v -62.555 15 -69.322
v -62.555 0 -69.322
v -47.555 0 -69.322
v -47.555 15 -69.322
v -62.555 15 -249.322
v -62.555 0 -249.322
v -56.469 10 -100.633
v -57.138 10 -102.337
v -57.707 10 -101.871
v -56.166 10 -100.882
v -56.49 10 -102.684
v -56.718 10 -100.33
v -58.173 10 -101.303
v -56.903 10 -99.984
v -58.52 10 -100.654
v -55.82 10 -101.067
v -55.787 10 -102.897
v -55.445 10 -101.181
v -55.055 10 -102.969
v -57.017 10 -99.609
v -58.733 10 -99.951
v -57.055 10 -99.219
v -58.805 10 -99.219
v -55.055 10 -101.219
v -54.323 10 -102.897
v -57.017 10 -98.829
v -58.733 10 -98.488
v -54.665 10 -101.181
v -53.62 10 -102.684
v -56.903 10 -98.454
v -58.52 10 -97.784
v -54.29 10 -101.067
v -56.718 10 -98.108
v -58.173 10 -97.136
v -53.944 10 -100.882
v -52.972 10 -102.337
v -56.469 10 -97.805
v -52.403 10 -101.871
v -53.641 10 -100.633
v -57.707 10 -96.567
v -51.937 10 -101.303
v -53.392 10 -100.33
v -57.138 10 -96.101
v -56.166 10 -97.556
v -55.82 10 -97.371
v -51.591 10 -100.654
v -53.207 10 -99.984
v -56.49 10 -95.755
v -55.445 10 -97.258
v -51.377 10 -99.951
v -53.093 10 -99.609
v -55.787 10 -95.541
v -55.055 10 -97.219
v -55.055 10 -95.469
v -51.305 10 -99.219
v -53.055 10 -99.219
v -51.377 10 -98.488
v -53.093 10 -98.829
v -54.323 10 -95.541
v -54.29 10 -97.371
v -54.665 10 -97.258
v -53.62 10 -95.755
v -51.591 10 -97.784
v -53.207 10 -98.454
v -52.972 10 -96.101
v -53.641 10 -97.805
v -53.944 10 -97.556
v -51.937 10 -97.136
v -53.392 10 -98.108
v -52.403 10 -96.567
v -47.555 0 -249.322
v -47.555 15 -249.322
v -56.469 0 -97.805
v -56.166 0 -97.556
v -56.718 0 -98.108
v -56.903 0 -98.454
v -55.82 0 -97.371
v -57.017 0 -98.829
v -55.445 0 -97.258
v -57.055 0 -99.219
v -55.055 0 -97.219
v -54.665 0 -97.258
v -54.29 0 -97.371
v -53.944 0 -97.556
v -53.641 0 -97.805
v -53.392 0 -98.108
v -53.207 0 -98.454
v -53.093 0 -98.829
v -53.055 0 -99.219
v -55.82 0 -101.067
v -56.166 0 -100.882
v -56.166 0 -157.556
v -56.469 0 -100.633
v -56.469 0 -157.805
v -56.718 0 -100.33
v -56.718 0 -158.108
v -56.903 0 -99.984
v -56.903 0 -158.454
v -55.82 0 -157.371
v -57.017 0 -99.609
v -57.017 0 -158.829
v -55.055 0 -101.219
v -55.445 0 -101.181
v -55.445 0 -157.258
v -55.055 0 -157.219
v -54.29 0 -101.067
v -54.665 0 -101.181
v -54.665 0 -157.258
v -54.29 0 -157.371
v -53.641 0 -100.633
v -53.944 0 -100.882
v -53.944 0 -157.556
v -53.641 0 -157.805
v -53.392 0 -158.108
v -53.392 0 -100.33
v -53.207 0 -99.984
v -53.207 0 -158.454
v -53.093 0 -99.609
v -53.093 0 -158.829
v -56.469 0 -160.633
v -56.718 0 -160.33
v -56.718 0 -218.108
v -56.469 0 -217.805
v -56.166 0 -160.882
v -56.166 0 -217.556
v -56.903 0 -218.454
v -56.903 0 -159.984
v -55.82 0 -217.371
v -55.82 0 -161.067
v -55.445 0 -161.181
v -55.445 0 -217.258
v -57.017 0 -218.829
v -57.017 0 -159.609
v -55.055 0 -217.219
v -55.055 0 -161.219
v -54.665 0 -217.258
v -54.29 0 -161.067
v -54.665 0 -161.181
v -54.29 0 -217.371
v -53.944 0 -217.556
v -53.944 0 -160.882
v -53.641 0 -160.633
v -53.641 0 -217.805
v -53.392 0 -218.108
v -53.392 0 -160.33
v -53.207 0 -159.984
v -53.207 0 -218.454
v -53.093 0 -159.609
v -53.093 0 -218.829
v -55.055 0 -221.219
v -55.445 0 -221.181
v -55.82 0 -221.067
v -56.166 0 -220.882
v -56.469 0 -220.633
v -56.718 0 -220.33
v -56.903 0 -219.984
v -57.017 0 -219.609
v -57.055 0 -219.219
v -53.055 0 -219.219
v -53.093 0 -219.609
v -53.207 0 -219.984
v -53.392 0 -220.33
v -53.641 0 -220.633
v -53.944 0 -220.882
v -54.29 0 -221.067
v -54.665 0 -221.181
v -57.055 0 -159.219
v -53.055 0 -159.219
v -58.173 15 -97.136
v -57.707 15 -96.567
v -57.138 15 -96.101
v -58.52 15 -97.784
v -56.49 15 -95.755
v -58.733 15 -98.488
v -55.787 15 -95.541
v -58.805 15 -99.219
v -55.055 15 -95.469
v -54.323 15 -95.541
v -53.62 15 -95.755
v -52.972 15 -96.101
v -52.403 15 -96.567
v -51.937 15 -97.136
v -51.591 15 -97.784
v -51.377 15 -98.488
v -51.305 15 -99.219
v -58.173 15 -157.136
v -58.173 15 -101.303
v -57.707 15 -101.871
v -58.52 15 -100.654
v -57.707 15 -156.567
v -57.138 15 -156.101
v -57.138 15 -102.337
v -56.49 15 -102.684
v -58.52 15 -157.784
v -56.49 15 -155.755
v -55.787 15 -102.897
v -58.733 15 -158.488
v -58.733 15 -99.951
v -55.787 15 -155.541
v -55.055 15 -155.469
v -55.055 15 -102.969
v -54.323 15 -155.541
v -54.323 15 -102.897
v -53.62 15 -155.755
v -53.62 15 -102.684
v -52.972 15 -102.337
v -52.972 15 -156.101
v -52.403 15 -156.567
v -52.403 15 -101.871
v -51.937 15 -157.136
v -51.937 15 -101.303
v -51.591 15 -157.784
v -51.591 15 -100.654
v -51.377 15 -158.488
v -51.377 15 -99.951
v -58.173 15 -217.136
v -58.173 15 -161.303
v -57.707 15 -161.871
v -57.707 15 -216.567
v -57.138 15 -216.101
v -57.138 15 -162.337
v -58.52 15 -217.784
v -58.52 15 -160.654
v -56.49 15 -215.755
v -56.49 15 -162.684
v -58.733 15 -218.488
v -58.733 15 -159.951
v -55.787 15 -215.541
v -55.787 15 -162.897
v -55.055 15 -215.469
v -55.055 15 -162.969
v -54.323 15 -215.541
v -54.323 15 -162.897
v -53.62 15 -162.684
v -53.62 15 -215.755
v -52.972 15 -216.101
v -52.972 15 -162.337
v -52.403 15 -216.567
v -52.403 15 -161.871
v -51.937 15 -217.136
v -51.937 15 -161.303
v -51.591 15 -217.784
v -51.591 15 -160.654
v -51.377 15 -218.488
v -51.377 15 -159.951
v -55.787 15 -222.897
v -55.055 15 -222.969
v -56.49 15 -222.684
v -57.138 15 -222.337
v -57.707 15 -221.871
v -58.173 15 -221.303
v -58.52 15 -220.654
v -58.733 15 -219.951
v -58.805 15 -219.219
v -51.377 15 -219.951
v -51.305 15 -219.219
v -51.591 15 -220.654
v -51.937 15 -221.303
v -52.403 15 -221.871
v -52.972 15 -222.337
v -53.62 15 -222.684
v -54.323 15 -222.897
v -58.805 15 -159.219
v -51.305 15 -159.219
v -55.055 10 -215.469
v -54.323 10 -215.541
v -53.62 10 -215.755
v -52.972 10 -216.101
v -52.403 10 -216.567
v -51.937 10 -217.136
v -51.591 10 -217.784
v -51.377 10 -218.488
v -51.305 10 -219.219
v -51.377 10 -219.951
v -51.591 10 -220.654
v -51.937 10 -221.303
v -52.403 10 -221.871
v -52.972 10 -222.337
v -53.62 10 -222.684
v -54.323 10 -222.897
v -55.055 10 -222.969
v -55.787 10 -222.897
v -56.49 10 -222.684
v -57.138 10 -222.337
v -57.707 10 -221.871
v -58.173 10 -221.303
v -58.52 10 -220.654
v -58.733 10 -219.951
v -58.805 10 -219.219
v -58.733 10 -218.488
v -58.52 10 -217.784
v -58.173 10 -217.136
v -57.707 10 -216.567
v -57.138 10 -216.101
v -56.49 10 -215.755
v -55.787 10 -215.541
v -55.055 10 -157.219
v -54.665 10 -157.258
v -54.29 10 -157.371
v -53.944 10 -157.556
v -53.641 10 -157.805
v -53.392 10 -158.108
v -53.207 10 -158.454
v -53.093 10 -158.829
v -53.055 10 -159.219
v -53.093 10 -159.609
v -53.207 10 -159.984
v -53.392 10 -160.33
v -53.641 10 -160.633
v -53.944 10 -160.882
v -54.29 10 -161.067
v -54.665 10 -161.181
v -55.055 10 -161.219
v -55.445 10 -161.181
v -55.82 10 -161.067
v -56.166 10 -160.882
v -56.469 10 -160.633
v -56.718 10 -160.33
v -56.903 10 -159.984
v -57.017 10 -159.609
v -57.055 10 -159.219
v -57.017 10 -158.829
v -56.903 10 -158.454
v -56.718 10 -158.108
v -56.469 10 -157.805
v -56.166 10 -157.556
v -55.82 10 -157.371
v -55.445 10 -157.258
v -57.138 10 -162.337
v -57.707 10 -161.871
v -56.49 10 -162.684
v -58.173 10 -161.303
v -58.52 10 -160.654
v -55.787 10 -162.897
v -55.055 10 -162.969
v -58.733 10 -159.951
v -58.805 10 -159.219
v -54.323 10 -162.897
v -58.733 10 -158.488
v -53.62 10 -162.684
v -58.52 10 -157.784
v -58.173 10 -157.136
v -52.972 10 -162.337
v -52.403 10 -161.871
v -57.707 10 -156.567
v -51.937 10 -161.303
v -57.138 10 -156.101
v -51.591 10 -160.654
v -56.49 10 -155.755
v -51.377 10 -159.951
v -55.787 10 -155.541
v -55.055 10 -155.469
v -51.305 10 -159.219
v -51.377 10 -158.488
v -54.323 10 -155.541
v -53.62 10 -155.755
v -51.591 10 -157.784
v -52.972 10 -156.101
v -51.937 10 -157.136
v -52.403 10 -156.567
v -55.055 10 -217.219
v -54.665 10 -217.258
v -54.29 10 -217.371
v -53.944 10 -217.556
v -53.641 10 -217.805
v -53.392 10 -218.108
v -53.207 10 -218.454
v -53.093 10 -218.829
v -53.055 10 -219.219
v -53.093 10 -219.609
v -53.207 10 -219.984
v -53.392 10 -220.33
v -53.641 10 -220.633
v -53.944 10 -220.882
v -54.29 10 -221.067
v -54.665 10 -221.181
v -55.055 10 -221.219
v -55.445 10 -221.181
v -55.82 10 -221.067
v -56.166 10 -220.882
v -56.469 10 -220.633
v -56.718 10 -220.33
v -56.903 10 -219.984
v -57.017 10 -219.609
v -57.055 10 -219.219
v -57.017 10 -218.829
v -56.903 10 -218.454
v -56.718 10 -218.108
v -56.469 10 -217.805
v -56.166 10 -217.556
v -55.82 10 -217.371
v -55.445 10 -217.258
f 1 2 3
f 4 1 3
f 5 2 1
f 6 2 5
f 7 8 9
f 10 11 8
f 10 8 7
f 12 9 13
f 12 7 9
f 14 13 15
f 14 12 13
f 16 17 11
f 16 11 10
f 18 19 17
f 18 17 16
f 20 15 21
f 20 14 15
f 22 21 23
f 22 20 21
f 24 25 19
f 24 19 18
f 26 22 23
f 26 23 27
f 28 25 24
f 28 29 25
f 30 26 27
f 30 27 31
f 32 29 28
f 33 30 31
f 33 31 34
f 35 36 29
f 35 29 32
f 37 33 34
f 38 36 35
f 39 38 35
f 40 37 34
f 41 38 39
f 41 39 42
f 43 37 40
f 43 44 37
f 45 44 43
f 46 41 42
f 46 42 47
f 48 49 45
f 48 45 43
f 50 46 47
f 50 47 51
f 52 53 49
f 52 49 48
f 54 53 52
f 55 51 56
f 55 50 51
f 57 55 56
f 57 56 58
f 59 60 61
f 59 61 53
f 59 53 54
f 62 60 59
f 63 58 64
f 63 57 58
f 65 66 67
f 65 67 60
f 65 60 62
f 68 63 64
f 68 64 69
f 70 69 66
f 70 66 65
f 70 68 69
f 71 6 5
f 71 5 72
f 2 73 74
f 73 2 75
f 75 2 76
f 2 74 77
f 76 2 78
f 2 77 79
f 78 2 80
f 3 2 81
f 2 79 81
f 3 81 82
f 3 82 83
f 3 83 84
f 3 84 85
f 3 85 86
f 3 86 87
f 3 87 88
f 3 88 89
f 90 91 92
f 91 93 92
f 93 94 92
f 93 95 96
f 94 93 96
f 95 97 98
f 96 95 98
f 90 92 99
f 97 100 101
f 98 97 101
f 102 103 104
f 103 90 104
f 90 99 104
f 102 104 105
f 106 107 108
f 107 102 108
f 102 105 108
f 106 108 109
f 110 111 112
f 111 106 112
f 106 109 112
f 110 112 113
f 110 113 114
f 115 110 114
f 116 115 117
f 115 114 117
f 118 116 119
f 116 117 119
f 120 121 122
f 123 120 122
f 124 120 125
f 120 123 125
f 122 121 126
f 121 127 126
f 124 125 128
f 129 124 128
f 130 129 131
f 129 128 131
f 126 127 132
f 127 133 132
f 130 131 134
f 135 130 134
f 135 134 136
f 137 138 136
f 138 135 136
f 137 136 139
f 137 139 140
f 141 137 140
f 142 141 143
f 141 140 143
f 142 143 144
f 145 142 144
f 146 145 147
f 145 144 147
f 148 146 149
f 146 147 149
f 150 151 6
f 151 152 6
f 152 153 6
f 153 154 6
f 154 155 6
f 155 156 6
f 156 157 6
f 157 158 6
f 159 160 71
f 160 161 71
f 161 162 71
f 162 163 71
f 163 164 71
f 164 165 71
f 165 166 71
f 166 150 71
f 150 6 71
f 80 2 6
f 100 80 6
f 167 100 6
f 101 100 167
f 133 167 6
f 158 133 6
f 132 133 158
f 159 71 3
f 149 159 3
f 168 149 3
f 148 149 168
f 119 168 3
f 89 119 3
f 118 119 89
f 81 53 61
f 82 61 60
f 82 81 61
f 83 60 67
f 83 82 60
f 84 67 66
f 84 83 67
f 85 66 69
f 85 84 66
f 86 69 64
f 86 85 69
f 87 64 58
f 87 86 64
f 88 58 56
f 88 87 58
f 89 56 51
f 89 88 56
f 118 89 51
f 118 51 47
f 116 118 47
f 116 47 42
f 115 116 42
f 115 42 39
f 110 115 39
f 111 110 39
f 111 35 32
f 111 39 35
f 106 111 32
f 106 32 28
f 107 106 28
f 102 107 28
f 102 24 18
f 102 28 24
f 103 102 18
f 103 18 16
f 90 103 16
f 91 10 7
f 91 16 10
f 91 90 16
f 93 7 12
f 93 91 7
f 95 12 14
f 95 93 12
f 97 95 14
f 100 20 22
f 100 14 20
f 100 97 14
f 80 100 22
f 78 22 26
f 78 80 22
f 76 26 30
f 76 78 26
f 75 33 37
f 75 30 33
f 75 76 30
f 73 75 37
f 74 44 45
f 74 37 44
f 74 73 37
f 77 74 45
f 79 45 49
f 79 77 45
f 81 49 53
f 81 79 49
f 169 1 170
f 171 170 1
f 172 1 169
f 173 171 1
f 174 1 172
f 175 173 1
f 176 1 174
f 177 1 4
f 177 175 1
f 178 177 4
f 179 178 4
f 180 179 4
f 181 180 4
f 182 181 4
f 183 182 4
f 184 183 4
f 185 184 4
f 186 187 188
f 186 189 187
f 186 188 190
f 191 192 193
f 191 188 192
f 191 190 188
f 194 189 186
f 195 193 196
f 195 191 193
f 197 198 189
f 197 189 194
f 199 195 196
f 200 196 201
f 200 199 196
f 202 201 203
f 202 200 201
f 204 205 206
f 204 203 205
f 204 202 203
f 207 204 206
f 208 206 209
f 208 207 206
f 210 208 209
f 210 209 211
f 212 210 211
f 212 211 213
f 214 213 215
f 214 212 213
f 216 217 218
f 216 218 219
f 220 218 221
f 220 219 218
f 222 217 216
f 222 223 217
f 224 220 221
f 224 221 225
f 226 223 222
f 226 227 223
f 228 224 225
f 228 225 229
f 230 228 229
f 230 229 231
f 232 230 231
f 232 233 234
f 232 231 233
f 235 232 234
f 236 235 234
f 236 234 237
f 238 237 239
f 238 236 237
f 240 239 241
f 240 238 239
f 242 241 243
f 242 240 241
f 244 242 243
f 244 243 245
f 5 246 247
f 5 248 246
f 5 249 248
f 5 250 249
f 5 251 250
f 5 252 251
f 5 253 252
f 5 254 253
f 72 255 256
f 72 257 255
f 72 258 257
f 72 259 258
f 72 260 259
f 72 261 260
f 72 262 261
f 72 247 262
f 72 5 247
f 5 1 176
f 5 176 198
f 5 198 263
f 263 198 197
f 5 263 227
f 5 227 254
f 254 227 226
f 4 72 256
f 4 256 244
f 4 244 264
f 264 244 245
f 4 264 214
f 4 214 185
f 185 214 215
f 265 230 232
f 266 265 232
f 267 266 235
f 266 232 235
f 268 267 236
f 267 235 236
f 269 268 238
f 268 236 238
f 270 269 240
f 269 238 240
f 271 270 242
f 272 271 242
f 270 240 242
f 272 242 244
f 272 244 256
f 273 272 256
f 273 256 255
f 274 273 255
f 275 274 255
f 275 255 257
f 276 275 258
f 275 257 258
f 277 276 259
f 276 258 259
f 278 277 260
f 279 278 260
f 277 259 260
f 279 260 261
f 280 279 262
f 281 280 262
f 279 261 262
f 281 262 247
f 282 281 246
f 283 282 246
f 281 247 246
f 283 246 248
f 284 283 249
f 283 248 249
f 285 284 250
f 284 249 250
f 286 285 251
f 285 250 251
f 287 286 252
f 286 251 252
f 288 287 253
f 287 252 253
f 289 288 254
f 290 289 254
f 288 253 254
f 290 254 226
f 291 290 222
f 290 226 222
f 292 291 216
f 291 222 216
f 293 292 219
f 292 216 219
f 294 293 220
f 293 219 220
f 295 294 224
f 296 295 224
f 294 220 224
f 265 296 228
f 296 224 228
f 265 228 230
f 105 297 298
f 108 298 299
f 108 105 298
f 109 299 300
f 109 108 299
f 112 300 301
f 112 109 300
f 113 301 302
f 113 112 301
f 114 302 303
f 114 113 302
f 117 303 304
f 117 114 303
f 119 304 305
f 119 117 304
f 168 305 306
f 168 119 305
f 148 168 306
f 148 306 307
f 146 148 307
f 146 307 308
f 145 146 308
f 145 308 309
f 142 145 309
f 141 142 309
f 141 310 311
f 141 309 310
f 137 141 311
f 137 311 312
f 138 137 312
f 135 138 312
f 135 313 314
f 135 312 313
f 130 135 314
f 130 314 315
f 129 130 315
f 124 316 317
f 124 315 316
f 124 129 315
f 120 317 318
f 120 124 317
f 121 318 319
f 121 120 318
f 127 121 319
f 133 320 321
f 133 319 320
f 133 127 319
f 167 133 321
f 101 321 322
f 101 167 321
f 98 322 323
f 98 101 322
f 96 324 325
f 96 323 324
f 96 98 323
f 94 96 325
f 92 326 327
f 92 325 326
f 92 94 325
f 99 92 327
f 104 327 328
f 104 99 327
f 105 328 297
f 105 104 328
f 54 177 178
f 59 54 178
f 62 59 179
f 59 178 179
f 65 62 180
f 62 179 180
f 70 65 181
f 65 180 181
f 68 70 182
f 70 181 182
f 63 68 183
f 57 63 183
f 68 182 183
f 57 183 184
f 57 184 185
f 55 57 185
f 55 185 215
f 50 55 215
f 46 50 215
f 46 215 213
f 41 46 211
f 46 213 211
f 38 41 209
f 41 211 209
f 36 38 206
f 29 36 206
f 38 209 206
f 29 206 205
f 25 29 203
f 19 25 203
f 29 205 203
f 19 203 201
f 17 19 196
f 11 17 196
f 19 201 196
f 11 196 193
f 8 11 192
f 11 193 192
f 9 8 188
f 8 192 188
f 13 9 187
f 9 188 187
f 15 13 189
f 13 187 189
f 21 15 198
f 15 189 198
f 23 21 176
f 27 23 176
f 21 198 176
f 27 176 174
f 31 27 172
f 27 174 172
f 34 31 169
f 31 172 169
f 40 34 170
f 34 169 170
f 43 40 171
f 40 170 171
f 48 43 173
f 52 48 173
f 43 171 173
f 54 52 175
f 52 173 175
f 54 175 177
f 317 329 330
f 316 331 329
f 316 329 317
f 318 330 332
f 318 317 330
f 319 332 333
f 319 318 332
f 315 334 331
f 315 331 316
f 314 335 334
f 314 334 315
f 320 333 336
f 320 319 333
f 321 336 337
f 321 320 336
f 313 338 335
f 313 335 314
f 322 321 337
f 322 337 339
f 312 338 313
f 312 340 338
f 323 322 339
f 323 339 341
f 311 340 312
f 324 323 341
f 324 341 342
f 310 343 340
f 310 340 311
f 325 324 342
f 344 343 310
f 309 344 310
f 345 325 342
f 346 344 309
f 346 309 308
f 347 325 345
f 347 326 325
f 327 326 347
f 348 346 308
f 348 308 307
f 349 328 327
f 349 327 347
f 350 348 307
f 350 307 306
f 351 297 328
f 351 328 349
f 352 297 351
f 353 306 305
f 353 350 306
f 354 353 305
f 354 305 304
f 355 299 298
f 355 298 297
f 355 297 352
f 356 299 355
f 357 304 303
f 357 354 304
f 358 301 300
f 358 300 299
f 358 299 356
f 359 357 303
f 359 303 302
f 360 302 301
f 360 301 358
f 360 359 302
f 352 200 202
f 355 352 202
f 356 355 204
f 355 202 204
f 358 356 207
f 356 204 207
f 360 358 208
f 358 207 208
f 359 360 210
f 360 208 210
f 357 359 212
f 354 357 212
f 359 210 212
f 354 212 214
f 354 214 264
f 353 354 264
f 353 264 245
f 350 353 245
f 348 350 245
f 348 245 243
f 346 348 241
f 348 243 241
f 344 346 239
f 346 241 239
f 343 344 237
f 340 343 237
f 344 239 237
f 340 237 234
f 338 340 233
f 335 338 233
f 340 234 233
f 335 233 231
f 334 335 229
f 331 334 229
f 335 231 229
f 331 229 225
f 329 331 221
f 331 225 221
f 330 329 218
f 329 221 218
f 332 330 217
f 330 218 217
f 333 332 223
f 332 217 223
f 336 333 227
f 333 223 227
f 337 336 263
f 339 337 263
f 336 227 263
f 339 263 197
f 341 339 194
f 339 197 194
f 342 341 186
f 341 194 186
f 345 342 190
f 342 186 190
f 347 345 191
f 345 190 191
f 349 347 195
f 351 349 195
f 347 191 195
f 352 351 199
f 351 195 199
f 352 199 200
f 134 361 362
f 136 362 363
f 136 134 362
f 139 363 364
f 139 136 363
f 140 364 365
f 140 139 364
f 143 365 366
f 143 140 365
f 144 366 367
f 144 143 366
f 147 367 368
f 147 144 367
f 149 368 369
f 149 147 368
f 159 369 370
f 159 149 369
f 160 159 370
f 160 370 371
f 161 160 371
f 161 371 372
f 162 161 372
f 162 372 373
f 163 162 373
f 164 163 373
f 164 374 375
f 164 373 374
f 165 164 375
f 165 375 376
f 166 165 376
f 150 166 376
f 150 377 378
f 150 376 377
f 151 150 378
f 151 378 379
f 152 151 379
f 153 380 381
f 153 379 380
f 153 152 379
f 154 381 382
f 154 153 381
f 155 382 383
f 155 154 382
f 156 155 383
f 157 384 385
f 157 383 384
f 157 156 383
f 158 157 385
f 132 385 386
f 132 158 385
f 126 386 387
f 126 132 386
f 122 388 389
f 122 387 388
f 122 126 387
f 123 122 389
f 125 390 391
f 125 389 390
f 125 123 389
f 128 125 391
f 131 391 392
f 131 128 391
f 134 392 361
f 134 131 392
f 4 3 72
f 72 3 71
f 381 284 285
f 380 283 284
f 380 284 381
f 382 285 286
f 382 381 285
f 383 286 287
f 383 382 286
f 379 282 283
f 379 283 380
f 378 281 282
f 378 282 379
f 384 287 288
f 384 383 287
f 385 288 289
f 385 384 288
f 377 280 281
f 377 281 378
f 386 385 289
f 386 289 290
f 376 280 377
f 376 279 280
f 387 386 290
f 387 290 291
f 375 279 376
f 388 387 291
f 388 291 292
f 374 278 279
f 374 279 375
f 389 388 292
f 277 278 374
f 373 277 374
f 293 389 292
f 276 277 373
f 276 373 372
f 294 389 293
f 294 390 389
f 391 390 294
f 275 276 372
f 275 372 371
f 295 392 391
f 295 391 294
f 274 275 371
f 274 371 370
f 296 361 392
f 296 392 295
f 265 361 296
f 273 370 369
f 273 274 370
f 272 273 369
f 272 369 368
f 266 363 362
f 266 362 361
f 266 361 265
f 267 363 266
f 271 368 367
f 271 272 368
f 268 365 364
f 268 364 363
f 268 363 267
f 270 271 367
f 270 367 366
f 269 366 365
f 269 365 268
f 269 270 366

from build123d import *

# Parameters (mm, degrees)
SKETCH_1_W          = 15
SKETCH_1_H          = 180
SKETCH_1_R          = 2
EXTRUDE_1_DEPTH     = 15
SKETCH_2_R          = 3.75
CUT_EXTRUDE_1_DEPTH = 5


with BuildPart() as part:
    # Эскиз1 → Бобышка-Вытянуть1 (new body)
    with BuildSketch(Plane(origin=(0, 0, 0), x_dir=(1, 0, 0), z_dir=(0, 1, 0))):
        with Locations((-55.055059152, 159.322347884)):
            Rectangle(SKETCH_1_W, SKETCH_1_H)
        with Locations(Location((-55.055059152, 219.219125448, 0), (0, 0, 270))):
            Circle(SKETCH_1_R, mode=Mode.SUBTRACT)
        with Locations(Location((-55.055059152, 159.219125448, 0), (0, 0, 270))):
            Circle(SKETCH_1_R, mode=Mode.SUBTRACT)
        with Locations(Location((-55.055059152, 99.219125448, 0), (0, 0, 270))):
            Circle(SKETCH_1_R, mode=Mode.SUBTRACT)
    extrude(amount=EXTRUDE_1_DEPTH)

    # Эскиз2 → Вырез-Вытянуть1 (cut)
    with BuildSketch(Plane(origin=(0, 15, 0), x_dir=(1, 0, 0), z_dir=(0, 1, 0))):
        with Locations(Location((-55.055059152, 99.219125448, 0), (0, 0, 270))):
            Circle(SKETCH_2_R)
        with Locations(Location((-55.055059152, 159.219125448, 0), (0, 0, 270))):
            Circle(SKETCH_2_R)
        with Locations(Location((-55.055059152, 219.219125448, 0), (0, 0, 270))):
            Circle(SKETCH_2_R)
    extrude(amount=-CUT_EXTRUDE_1_DEPTH, mode=Mode.SUBTRACT)


solid = part.part
